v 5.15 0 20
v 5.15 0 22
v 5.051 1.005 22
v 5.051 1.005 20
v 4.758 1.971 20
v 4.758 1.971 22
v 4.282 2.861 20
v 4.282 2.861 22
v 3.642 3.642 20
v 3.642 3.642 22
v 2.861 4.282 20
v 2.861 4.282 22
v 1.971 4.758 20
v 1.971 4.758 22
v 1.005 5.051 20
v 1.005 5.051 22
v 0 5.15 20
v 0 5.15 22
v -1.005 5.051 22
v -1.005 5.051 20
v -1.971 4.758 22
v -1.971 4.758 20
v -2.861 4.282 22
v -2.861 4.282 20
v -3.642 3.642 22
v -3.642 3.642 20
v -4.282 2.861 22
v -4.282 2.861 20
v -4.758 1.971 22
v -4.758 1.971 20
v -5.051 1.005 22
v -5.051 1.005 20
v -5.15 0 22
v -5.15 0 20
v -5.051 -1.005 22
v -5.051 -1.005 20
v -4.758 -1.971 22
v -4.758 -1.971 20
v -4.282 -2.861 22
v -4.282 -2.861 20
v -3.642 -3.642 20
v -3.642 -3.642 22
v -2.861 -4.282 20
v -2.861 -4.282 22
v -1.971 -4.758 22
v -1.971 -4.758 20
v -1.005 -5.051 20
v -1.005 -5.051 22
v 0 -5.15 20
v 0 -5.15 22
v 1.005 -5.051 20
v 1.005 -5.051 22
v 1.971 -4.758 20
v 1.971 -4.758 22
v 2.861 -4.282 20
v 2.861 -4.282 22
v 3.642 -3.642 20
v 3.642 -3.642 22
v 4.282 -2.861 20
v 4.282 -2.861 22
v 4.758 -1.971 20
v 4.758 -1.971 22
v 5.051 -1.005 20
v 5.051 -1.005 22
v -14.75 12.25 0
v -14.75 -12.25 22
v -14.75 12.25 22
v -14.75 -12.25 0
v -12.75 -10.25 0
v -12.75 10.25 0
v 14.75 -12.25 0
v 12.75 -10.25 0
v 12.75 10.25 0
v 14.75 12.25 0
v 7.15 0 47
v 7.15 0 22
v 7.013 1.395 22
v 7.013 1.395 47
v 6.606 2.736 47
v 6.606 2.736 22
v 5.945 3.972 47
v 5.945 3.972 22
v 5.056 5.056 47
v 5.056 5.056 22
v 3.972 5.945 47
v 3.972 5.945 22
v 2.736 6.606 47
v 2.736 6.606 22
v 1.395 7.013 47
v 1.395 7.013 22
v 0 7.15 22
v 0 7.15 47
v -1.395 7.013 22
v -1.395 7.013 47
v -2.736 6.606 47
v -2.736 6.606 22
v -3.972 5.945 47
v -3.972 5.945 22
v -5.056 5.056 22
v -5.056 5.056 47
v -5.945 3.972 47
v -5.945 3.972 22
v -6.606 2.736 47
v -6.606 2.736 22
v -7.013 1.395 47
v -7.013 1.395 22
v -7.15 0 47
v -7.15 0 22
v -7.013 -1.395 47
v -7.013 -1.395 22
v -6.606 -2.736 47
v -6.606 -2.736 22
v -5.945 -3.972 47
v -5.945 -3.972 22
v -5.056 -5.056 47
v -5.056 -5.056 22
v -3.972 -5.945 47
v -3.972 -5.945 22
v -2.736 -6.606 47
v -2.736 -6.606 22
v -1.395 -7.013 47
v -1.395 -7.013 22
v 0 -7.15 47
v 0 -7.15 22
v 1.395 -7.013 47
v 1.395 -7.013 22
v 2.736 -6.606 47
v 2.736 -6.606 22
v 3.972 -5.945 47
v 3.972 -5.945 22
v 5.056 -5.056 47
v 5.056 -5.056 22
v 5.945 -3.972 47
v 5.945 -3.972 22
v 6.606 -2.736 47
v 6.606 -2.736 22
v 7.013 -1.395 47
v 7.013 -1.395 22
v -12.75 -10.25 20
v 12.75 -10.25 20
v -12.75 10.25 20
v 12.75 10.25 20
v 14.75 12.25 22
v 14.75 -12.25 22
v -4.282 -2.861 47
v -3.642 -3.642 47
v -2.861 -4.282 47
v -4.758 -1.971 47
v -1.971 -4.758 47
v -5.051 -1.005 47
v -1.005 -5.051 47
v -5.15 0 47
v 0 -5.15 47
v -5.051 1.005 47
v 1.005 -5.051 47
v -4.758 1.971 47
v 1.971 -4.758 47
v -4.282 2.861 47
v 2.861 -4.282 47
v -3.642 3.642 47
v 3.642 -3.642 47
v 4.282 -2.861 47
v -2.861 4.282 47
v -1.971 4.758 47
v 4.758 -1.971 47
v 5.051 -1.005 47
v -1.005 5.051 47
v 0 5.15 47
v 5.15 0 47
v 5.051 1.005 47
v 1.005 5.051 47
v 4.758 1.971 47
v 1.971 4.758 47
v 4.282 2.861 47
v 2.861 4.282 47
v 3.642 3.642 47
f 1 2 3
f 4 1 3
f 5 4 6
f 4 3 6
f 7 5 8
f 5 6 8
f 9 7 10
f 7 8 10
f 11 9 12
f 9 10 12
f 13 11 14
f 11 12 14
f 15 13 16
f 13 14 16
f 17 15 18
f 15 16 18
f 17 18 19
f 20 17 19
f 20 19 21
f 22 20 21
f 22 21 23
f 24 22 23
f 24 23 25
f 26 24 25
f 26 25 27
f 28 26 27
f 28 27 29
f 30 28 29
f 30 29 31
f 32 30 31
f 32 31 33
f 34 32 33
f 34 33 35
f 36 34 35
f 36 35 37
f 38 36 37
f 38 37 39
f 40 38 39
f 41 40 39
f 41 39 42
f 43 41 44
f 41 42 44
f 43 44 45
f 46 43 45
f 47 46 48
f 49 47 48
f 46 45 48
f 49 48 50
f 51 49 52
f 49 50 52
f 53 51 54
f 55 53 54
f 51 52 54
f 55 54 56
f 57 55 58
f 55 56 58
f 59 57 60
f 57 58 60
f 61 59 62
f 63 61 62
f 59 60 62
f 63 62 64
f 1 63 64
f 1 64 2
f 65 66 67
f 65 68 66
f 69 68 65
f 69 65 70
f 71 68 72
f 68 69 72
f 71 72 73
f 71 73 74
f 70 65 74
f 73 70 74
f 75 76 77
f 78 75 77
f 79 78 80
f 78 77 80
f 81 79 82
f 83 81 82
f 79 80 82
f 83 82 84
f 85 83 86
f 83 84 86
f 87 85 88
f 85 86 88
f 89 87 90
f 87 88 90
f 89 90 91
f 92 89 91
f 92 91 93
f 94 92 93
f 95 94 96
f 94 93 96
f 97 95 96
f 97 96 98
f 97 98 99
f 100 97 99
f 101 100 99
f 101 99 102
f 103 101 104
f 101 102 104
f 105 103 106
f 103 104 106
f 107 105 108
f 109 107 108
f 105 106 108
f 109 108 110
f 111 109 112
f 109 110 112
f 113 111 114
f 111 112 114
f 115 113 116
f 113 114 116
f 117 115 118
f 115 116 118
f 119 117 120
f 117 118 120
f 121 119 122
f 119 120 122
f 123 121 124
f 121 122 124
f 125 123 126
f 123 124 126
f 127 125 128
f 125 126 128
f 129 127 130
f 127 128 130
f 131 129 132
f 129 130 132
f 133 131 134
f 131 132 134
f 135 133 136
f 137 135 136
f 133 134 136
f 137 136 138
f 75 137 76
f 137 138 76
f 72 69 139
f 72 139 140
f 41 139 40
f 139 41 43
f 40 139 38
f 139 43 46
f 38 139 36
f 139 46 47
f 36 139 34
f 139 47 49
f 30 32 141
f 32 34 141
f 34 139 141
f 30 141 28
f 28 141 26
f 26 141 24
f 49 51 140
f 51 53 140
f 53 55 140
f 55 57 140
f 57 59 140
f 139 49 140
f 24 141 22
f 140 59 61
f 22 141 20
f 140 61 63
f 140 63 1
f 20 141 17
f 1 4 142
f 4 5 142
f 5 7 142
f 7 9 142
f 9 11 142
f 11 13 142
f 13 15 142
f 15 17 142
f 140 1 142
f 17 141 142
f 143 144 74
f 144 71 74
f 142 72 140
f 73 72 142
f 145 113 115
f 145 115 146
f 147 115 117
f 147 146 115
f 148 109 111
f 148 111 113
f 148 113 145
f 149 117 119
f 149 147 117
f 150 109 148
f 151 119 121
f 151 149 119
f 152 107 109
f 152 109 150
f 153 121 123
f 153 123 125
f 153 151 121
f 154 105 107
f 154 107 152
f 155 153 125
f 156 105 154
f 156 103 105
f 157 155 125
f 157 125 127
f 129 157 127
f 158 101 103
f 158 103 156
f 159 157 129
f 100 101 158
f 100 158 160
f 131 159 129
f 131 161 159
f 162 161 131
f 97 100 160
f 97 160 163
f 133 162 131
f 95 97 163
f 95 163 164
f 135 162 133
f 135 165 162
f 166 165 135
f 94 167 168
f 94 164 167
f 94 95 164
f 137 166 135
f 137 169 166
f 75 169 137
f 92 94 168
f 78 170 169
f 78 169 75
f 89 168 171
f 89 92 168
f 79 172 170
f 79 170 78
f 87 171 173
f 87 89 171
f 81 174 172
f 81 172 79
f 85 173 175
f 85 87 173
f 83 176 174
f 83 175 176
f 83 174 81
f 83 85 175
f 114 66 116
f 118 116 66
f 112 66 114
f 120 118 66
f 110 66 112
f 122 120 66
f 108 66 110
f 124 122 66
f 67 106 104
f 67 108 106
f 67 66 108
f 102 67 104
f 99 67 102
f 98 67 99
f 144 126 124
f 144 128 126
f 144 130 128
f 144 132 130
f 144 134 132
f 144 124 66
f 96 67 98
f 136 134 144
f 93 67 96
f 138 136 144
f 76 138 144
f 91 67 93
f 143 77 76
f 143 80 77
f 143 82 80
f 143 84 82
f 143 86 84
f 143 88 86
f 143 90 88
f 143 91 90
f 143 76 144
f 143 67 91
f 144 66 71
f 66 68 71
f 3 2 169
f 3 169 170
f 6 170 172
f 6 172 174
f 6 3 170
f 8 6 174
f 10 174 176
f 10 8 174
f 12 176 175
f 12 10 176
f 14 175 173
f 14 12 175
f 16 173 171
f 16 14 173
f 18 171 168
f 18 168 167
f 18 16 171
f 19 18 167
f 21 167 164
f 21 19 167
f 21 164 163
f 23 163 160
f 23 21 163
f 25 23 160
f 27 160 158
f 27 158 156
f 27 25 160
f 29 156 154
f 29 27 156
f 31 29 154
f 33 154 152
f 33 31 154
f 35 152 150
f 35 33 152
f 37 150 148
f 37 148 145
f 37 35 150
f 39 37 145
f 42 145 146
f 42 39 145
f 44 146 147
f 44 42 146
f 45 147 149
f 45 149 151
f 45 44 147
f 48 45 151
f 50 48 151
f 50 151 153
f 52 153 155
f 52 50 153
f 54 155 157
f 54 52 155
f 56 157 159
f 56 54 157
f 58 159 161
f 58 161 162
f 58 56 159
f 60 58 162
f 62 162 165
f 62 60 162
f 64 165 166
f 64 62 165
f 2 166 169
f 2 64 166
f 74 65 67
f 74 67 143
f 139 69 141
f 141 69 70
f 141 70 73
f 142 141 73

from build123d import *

# Parameters (mm, degrees)
F0_W      = 29.5
F0_H      = 24.5
F0_W_2    = 25.5
F0_H_2    = 20.5
F1_DEPTH  = 20
F2_W      = 29.5
F2_H      = 24.5
F3_DEPTH  = 2
F4_R      = 7.15
F4_R_2    = 5.15
F5_DEPTH  = 25
F5_FACE_R = 5.15
F6_DEPTH  = 25


with BuildPart() as f1:
    # F0 (on Top) → F1 (new body)
    with BuildSketch(Plane.XY):
        Rectangle(F0_W, F0_H)
        Rectangle(F0_W_2, F0_H_2, mode=Mode.SUBTRACT)
    extrude(amount=F1_DEPTH)

    # F2 (on face) → F3 (join)
    with BuildSketch(Plane.XY.offset(20)):
        Rectangle(F2_W, F2_H)
    extrude(amount=F3_DEPTH)

    # F4 (on face) → F5 (join)
    with BuildSketch(Plane.XY.offset(22)):
        Circle(F4_R)
        Circle(F4_R_2, mode=Mode.SUBTRACT)
    extrude(amount=F5_DEPTH)

    # F5_face (on face) → F6 (cut)
    with BuildSketch(Plane.XY.offset(22)):
        Circle(F5_FACE_R)
    extrude(amount=-F6_DEPTH, mode=Mode.SUBTRACT)


solid = f1.part
